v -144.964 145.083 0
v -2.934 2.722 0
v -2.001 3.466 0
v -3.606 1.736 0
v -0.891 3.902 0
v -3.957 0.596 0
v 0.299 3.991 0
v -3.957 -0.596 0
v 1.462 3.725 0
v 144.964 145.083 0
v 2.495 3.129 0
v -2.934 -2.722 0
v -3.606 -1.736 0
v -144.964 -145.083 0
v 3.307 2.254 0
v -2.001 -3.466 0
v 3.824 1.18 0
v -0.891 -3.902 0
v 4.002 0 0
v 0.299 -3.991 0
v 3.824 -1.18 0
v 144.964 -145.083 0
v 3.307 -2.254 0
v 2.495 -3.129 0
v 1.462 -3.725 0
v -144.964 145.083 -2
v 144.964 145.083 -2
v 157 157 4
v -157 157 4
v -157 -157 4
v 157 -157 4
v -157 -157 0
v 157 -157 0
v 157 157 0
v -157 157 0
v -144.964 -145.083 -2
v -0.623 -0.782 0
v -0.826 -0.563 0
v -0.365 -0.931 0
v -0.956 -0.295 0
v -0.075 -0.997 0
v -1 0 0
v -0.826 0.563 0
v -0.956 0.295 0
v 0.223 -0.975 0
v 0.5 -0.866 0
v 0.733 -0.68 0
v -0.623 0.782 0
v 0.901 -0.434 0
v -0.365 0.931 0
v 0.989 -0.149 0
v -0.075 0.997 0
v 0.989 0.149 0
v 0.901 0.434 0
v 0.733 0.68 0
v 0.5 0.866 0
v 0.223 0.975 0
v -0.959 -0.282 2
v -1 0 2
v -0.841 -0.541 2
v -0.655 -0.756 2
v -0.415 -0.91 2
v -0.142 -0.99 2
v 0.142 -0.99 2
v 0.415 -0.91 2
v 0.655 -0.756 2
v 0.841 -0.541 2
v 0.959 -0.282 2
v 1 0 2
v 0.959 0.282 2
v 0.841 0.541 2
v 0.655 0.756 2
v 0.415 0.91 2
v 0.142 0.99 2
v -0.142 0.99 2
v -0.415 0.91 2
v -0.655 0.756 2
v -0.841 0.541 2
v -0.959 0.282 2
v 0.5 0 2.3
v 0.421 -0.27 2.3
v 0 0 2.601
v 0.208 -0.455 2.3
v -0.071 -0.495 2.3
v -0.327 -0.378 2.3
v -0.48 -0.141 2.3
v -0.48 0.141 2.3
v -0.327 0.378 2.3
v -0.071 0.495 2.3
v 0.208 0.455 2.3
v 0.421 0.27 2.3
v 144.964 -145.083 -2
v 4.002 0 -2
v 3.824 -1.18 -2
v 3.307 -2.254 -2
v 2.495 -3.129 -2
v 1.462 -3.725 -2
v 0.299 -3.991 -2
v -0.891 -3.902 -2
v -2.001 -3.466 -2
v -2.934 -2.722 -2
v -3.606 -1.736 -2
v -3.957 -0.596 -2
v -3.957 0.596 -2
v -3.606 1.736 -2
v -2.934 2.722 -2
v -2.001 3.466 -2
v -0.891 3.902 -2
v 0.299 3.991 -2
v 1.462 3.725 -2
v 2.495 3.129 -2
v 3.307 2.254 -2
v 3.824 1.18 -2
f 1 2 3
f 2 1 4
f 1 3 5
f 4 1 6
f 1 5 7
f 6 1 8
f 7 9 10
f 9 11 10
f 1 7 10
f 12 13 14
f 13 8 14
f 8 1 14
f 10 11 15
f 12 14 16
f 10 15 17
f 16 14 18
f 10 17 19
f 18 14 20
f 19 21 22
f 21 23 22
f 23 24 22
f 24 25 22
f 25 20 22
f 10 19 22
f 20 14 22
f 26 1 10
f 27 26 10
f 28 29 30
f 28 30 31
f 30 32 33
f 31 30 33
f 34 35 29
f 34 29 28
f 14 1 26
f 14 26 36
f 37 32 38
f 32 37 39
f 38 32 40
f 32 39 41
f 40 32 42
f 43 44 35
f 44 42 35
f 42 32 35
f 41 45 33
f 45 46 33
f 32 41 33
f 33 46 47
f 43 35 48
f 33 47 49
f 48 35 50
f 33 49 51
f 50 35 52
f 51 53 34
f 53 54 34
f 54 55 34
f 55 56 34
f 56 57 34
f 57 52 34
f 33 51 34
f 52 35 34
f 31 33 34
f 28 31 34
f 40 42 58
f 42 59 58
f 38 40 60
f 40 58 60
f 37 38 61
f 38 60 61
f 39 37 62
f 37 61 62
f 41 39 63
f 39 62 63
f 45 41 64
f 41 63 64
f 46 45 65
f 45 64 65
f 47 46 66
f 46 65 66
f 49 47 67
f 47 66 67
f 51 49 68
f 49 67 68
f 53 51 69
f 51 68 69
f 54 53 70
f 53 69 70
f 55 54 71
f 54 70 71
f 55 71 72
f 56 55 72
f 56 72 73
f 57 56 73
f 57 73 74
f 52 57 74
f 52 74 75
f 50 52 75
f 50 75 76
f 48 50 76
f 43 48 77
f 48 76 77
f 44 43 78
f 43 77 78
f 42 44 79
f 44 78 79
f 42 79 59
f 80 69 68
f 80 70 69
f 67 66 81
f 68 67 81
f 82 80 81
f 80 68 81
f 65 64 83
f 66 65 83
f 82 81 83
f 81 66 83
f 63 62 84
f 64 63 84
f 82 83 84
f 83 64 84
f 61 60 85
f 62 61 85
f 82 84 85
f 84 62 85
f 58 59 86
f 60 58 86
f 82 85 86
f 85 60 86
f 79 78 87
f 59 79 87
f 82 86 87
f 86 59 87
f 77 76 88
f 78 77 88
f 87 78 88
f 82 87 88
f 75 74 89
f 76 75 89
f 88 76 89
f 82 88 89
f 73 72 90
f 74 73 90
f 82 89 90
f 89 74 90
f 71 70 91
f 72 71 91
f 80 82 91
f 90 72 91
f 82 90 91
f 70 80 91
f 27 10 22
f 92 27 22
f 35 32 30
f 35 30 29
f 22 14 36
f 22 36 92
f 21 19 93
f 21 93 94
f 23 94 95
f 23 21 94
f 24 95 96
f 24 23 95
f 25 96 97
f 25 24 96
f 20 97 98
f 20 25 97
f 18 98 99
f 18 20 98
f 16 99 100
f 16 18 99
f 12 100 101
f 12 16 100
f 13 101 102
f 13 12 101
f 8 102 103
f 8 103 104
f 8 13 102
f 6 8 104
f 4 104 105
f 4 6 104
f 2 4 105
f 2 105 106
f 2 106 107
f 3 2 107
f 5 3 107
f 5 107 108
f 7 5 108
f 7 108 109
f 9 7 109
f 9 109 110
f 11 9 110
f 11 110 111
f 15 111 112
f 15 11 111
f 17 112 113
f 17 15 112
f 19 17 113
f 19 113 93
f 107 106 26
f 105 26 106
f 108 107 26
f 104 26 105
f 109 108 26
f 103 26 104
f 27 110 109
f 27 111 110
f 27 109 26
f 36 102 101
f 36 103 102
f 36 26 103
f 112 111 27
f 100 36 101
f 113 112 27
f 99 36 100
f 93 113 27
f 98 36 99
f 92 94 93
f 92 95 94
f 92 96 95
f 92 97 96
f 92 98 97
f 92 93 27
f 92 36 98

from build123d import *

# Parameters (mm, degrees)
F0_W     = 314
F0_H     = 314
F1_DEPTH = 4
F3_D     = 2
F3_DEPTH = 2
F3_TIP   = 0.600860619
F4_W     = 289.927393198
F4_H     = 290.1662886143
F4_R     = 4.0020322837
F5_DEPTH = 2


with BuildPart() as f1:
    # F0 (on Top) → F1 (new body)
    with BuildSketch(Plane.XY):
        Rectangle(F0_W, F0_H)
    extrude(amount=F1_DEPTH)

    # F3
    with Locations(Plane(origin=(0, 0, 0), x_dir=(1, 0, 0), z_dir=(0, 0, -1))):
        with Locations((0, 0)):
            Hole(F3_D / 2, depth=F3_DEPTH)
            with Locations((0, 0, -(F3_DEPTH + F3_TIP / 2))):  # 118° drill point
                Cone(0, F3_D / 2, F3_TIP, mode=Mode.SUBTRACT)


with BuildPart() as f5:
    # F4 (on face) → F5 (new body)
    with BuildSketch(Plane(origin=(0, 0, 0), x_dir=(1, 0, 0), z_dir=(0, 0, -1))):
        Rectangle(F4_W, F4_H)
        Circle(F4_R, mode=Mode.SUBTRACT)
    extrude(amount=F5_DEPTH)


solid = Compound([f1.part, f5.part])
